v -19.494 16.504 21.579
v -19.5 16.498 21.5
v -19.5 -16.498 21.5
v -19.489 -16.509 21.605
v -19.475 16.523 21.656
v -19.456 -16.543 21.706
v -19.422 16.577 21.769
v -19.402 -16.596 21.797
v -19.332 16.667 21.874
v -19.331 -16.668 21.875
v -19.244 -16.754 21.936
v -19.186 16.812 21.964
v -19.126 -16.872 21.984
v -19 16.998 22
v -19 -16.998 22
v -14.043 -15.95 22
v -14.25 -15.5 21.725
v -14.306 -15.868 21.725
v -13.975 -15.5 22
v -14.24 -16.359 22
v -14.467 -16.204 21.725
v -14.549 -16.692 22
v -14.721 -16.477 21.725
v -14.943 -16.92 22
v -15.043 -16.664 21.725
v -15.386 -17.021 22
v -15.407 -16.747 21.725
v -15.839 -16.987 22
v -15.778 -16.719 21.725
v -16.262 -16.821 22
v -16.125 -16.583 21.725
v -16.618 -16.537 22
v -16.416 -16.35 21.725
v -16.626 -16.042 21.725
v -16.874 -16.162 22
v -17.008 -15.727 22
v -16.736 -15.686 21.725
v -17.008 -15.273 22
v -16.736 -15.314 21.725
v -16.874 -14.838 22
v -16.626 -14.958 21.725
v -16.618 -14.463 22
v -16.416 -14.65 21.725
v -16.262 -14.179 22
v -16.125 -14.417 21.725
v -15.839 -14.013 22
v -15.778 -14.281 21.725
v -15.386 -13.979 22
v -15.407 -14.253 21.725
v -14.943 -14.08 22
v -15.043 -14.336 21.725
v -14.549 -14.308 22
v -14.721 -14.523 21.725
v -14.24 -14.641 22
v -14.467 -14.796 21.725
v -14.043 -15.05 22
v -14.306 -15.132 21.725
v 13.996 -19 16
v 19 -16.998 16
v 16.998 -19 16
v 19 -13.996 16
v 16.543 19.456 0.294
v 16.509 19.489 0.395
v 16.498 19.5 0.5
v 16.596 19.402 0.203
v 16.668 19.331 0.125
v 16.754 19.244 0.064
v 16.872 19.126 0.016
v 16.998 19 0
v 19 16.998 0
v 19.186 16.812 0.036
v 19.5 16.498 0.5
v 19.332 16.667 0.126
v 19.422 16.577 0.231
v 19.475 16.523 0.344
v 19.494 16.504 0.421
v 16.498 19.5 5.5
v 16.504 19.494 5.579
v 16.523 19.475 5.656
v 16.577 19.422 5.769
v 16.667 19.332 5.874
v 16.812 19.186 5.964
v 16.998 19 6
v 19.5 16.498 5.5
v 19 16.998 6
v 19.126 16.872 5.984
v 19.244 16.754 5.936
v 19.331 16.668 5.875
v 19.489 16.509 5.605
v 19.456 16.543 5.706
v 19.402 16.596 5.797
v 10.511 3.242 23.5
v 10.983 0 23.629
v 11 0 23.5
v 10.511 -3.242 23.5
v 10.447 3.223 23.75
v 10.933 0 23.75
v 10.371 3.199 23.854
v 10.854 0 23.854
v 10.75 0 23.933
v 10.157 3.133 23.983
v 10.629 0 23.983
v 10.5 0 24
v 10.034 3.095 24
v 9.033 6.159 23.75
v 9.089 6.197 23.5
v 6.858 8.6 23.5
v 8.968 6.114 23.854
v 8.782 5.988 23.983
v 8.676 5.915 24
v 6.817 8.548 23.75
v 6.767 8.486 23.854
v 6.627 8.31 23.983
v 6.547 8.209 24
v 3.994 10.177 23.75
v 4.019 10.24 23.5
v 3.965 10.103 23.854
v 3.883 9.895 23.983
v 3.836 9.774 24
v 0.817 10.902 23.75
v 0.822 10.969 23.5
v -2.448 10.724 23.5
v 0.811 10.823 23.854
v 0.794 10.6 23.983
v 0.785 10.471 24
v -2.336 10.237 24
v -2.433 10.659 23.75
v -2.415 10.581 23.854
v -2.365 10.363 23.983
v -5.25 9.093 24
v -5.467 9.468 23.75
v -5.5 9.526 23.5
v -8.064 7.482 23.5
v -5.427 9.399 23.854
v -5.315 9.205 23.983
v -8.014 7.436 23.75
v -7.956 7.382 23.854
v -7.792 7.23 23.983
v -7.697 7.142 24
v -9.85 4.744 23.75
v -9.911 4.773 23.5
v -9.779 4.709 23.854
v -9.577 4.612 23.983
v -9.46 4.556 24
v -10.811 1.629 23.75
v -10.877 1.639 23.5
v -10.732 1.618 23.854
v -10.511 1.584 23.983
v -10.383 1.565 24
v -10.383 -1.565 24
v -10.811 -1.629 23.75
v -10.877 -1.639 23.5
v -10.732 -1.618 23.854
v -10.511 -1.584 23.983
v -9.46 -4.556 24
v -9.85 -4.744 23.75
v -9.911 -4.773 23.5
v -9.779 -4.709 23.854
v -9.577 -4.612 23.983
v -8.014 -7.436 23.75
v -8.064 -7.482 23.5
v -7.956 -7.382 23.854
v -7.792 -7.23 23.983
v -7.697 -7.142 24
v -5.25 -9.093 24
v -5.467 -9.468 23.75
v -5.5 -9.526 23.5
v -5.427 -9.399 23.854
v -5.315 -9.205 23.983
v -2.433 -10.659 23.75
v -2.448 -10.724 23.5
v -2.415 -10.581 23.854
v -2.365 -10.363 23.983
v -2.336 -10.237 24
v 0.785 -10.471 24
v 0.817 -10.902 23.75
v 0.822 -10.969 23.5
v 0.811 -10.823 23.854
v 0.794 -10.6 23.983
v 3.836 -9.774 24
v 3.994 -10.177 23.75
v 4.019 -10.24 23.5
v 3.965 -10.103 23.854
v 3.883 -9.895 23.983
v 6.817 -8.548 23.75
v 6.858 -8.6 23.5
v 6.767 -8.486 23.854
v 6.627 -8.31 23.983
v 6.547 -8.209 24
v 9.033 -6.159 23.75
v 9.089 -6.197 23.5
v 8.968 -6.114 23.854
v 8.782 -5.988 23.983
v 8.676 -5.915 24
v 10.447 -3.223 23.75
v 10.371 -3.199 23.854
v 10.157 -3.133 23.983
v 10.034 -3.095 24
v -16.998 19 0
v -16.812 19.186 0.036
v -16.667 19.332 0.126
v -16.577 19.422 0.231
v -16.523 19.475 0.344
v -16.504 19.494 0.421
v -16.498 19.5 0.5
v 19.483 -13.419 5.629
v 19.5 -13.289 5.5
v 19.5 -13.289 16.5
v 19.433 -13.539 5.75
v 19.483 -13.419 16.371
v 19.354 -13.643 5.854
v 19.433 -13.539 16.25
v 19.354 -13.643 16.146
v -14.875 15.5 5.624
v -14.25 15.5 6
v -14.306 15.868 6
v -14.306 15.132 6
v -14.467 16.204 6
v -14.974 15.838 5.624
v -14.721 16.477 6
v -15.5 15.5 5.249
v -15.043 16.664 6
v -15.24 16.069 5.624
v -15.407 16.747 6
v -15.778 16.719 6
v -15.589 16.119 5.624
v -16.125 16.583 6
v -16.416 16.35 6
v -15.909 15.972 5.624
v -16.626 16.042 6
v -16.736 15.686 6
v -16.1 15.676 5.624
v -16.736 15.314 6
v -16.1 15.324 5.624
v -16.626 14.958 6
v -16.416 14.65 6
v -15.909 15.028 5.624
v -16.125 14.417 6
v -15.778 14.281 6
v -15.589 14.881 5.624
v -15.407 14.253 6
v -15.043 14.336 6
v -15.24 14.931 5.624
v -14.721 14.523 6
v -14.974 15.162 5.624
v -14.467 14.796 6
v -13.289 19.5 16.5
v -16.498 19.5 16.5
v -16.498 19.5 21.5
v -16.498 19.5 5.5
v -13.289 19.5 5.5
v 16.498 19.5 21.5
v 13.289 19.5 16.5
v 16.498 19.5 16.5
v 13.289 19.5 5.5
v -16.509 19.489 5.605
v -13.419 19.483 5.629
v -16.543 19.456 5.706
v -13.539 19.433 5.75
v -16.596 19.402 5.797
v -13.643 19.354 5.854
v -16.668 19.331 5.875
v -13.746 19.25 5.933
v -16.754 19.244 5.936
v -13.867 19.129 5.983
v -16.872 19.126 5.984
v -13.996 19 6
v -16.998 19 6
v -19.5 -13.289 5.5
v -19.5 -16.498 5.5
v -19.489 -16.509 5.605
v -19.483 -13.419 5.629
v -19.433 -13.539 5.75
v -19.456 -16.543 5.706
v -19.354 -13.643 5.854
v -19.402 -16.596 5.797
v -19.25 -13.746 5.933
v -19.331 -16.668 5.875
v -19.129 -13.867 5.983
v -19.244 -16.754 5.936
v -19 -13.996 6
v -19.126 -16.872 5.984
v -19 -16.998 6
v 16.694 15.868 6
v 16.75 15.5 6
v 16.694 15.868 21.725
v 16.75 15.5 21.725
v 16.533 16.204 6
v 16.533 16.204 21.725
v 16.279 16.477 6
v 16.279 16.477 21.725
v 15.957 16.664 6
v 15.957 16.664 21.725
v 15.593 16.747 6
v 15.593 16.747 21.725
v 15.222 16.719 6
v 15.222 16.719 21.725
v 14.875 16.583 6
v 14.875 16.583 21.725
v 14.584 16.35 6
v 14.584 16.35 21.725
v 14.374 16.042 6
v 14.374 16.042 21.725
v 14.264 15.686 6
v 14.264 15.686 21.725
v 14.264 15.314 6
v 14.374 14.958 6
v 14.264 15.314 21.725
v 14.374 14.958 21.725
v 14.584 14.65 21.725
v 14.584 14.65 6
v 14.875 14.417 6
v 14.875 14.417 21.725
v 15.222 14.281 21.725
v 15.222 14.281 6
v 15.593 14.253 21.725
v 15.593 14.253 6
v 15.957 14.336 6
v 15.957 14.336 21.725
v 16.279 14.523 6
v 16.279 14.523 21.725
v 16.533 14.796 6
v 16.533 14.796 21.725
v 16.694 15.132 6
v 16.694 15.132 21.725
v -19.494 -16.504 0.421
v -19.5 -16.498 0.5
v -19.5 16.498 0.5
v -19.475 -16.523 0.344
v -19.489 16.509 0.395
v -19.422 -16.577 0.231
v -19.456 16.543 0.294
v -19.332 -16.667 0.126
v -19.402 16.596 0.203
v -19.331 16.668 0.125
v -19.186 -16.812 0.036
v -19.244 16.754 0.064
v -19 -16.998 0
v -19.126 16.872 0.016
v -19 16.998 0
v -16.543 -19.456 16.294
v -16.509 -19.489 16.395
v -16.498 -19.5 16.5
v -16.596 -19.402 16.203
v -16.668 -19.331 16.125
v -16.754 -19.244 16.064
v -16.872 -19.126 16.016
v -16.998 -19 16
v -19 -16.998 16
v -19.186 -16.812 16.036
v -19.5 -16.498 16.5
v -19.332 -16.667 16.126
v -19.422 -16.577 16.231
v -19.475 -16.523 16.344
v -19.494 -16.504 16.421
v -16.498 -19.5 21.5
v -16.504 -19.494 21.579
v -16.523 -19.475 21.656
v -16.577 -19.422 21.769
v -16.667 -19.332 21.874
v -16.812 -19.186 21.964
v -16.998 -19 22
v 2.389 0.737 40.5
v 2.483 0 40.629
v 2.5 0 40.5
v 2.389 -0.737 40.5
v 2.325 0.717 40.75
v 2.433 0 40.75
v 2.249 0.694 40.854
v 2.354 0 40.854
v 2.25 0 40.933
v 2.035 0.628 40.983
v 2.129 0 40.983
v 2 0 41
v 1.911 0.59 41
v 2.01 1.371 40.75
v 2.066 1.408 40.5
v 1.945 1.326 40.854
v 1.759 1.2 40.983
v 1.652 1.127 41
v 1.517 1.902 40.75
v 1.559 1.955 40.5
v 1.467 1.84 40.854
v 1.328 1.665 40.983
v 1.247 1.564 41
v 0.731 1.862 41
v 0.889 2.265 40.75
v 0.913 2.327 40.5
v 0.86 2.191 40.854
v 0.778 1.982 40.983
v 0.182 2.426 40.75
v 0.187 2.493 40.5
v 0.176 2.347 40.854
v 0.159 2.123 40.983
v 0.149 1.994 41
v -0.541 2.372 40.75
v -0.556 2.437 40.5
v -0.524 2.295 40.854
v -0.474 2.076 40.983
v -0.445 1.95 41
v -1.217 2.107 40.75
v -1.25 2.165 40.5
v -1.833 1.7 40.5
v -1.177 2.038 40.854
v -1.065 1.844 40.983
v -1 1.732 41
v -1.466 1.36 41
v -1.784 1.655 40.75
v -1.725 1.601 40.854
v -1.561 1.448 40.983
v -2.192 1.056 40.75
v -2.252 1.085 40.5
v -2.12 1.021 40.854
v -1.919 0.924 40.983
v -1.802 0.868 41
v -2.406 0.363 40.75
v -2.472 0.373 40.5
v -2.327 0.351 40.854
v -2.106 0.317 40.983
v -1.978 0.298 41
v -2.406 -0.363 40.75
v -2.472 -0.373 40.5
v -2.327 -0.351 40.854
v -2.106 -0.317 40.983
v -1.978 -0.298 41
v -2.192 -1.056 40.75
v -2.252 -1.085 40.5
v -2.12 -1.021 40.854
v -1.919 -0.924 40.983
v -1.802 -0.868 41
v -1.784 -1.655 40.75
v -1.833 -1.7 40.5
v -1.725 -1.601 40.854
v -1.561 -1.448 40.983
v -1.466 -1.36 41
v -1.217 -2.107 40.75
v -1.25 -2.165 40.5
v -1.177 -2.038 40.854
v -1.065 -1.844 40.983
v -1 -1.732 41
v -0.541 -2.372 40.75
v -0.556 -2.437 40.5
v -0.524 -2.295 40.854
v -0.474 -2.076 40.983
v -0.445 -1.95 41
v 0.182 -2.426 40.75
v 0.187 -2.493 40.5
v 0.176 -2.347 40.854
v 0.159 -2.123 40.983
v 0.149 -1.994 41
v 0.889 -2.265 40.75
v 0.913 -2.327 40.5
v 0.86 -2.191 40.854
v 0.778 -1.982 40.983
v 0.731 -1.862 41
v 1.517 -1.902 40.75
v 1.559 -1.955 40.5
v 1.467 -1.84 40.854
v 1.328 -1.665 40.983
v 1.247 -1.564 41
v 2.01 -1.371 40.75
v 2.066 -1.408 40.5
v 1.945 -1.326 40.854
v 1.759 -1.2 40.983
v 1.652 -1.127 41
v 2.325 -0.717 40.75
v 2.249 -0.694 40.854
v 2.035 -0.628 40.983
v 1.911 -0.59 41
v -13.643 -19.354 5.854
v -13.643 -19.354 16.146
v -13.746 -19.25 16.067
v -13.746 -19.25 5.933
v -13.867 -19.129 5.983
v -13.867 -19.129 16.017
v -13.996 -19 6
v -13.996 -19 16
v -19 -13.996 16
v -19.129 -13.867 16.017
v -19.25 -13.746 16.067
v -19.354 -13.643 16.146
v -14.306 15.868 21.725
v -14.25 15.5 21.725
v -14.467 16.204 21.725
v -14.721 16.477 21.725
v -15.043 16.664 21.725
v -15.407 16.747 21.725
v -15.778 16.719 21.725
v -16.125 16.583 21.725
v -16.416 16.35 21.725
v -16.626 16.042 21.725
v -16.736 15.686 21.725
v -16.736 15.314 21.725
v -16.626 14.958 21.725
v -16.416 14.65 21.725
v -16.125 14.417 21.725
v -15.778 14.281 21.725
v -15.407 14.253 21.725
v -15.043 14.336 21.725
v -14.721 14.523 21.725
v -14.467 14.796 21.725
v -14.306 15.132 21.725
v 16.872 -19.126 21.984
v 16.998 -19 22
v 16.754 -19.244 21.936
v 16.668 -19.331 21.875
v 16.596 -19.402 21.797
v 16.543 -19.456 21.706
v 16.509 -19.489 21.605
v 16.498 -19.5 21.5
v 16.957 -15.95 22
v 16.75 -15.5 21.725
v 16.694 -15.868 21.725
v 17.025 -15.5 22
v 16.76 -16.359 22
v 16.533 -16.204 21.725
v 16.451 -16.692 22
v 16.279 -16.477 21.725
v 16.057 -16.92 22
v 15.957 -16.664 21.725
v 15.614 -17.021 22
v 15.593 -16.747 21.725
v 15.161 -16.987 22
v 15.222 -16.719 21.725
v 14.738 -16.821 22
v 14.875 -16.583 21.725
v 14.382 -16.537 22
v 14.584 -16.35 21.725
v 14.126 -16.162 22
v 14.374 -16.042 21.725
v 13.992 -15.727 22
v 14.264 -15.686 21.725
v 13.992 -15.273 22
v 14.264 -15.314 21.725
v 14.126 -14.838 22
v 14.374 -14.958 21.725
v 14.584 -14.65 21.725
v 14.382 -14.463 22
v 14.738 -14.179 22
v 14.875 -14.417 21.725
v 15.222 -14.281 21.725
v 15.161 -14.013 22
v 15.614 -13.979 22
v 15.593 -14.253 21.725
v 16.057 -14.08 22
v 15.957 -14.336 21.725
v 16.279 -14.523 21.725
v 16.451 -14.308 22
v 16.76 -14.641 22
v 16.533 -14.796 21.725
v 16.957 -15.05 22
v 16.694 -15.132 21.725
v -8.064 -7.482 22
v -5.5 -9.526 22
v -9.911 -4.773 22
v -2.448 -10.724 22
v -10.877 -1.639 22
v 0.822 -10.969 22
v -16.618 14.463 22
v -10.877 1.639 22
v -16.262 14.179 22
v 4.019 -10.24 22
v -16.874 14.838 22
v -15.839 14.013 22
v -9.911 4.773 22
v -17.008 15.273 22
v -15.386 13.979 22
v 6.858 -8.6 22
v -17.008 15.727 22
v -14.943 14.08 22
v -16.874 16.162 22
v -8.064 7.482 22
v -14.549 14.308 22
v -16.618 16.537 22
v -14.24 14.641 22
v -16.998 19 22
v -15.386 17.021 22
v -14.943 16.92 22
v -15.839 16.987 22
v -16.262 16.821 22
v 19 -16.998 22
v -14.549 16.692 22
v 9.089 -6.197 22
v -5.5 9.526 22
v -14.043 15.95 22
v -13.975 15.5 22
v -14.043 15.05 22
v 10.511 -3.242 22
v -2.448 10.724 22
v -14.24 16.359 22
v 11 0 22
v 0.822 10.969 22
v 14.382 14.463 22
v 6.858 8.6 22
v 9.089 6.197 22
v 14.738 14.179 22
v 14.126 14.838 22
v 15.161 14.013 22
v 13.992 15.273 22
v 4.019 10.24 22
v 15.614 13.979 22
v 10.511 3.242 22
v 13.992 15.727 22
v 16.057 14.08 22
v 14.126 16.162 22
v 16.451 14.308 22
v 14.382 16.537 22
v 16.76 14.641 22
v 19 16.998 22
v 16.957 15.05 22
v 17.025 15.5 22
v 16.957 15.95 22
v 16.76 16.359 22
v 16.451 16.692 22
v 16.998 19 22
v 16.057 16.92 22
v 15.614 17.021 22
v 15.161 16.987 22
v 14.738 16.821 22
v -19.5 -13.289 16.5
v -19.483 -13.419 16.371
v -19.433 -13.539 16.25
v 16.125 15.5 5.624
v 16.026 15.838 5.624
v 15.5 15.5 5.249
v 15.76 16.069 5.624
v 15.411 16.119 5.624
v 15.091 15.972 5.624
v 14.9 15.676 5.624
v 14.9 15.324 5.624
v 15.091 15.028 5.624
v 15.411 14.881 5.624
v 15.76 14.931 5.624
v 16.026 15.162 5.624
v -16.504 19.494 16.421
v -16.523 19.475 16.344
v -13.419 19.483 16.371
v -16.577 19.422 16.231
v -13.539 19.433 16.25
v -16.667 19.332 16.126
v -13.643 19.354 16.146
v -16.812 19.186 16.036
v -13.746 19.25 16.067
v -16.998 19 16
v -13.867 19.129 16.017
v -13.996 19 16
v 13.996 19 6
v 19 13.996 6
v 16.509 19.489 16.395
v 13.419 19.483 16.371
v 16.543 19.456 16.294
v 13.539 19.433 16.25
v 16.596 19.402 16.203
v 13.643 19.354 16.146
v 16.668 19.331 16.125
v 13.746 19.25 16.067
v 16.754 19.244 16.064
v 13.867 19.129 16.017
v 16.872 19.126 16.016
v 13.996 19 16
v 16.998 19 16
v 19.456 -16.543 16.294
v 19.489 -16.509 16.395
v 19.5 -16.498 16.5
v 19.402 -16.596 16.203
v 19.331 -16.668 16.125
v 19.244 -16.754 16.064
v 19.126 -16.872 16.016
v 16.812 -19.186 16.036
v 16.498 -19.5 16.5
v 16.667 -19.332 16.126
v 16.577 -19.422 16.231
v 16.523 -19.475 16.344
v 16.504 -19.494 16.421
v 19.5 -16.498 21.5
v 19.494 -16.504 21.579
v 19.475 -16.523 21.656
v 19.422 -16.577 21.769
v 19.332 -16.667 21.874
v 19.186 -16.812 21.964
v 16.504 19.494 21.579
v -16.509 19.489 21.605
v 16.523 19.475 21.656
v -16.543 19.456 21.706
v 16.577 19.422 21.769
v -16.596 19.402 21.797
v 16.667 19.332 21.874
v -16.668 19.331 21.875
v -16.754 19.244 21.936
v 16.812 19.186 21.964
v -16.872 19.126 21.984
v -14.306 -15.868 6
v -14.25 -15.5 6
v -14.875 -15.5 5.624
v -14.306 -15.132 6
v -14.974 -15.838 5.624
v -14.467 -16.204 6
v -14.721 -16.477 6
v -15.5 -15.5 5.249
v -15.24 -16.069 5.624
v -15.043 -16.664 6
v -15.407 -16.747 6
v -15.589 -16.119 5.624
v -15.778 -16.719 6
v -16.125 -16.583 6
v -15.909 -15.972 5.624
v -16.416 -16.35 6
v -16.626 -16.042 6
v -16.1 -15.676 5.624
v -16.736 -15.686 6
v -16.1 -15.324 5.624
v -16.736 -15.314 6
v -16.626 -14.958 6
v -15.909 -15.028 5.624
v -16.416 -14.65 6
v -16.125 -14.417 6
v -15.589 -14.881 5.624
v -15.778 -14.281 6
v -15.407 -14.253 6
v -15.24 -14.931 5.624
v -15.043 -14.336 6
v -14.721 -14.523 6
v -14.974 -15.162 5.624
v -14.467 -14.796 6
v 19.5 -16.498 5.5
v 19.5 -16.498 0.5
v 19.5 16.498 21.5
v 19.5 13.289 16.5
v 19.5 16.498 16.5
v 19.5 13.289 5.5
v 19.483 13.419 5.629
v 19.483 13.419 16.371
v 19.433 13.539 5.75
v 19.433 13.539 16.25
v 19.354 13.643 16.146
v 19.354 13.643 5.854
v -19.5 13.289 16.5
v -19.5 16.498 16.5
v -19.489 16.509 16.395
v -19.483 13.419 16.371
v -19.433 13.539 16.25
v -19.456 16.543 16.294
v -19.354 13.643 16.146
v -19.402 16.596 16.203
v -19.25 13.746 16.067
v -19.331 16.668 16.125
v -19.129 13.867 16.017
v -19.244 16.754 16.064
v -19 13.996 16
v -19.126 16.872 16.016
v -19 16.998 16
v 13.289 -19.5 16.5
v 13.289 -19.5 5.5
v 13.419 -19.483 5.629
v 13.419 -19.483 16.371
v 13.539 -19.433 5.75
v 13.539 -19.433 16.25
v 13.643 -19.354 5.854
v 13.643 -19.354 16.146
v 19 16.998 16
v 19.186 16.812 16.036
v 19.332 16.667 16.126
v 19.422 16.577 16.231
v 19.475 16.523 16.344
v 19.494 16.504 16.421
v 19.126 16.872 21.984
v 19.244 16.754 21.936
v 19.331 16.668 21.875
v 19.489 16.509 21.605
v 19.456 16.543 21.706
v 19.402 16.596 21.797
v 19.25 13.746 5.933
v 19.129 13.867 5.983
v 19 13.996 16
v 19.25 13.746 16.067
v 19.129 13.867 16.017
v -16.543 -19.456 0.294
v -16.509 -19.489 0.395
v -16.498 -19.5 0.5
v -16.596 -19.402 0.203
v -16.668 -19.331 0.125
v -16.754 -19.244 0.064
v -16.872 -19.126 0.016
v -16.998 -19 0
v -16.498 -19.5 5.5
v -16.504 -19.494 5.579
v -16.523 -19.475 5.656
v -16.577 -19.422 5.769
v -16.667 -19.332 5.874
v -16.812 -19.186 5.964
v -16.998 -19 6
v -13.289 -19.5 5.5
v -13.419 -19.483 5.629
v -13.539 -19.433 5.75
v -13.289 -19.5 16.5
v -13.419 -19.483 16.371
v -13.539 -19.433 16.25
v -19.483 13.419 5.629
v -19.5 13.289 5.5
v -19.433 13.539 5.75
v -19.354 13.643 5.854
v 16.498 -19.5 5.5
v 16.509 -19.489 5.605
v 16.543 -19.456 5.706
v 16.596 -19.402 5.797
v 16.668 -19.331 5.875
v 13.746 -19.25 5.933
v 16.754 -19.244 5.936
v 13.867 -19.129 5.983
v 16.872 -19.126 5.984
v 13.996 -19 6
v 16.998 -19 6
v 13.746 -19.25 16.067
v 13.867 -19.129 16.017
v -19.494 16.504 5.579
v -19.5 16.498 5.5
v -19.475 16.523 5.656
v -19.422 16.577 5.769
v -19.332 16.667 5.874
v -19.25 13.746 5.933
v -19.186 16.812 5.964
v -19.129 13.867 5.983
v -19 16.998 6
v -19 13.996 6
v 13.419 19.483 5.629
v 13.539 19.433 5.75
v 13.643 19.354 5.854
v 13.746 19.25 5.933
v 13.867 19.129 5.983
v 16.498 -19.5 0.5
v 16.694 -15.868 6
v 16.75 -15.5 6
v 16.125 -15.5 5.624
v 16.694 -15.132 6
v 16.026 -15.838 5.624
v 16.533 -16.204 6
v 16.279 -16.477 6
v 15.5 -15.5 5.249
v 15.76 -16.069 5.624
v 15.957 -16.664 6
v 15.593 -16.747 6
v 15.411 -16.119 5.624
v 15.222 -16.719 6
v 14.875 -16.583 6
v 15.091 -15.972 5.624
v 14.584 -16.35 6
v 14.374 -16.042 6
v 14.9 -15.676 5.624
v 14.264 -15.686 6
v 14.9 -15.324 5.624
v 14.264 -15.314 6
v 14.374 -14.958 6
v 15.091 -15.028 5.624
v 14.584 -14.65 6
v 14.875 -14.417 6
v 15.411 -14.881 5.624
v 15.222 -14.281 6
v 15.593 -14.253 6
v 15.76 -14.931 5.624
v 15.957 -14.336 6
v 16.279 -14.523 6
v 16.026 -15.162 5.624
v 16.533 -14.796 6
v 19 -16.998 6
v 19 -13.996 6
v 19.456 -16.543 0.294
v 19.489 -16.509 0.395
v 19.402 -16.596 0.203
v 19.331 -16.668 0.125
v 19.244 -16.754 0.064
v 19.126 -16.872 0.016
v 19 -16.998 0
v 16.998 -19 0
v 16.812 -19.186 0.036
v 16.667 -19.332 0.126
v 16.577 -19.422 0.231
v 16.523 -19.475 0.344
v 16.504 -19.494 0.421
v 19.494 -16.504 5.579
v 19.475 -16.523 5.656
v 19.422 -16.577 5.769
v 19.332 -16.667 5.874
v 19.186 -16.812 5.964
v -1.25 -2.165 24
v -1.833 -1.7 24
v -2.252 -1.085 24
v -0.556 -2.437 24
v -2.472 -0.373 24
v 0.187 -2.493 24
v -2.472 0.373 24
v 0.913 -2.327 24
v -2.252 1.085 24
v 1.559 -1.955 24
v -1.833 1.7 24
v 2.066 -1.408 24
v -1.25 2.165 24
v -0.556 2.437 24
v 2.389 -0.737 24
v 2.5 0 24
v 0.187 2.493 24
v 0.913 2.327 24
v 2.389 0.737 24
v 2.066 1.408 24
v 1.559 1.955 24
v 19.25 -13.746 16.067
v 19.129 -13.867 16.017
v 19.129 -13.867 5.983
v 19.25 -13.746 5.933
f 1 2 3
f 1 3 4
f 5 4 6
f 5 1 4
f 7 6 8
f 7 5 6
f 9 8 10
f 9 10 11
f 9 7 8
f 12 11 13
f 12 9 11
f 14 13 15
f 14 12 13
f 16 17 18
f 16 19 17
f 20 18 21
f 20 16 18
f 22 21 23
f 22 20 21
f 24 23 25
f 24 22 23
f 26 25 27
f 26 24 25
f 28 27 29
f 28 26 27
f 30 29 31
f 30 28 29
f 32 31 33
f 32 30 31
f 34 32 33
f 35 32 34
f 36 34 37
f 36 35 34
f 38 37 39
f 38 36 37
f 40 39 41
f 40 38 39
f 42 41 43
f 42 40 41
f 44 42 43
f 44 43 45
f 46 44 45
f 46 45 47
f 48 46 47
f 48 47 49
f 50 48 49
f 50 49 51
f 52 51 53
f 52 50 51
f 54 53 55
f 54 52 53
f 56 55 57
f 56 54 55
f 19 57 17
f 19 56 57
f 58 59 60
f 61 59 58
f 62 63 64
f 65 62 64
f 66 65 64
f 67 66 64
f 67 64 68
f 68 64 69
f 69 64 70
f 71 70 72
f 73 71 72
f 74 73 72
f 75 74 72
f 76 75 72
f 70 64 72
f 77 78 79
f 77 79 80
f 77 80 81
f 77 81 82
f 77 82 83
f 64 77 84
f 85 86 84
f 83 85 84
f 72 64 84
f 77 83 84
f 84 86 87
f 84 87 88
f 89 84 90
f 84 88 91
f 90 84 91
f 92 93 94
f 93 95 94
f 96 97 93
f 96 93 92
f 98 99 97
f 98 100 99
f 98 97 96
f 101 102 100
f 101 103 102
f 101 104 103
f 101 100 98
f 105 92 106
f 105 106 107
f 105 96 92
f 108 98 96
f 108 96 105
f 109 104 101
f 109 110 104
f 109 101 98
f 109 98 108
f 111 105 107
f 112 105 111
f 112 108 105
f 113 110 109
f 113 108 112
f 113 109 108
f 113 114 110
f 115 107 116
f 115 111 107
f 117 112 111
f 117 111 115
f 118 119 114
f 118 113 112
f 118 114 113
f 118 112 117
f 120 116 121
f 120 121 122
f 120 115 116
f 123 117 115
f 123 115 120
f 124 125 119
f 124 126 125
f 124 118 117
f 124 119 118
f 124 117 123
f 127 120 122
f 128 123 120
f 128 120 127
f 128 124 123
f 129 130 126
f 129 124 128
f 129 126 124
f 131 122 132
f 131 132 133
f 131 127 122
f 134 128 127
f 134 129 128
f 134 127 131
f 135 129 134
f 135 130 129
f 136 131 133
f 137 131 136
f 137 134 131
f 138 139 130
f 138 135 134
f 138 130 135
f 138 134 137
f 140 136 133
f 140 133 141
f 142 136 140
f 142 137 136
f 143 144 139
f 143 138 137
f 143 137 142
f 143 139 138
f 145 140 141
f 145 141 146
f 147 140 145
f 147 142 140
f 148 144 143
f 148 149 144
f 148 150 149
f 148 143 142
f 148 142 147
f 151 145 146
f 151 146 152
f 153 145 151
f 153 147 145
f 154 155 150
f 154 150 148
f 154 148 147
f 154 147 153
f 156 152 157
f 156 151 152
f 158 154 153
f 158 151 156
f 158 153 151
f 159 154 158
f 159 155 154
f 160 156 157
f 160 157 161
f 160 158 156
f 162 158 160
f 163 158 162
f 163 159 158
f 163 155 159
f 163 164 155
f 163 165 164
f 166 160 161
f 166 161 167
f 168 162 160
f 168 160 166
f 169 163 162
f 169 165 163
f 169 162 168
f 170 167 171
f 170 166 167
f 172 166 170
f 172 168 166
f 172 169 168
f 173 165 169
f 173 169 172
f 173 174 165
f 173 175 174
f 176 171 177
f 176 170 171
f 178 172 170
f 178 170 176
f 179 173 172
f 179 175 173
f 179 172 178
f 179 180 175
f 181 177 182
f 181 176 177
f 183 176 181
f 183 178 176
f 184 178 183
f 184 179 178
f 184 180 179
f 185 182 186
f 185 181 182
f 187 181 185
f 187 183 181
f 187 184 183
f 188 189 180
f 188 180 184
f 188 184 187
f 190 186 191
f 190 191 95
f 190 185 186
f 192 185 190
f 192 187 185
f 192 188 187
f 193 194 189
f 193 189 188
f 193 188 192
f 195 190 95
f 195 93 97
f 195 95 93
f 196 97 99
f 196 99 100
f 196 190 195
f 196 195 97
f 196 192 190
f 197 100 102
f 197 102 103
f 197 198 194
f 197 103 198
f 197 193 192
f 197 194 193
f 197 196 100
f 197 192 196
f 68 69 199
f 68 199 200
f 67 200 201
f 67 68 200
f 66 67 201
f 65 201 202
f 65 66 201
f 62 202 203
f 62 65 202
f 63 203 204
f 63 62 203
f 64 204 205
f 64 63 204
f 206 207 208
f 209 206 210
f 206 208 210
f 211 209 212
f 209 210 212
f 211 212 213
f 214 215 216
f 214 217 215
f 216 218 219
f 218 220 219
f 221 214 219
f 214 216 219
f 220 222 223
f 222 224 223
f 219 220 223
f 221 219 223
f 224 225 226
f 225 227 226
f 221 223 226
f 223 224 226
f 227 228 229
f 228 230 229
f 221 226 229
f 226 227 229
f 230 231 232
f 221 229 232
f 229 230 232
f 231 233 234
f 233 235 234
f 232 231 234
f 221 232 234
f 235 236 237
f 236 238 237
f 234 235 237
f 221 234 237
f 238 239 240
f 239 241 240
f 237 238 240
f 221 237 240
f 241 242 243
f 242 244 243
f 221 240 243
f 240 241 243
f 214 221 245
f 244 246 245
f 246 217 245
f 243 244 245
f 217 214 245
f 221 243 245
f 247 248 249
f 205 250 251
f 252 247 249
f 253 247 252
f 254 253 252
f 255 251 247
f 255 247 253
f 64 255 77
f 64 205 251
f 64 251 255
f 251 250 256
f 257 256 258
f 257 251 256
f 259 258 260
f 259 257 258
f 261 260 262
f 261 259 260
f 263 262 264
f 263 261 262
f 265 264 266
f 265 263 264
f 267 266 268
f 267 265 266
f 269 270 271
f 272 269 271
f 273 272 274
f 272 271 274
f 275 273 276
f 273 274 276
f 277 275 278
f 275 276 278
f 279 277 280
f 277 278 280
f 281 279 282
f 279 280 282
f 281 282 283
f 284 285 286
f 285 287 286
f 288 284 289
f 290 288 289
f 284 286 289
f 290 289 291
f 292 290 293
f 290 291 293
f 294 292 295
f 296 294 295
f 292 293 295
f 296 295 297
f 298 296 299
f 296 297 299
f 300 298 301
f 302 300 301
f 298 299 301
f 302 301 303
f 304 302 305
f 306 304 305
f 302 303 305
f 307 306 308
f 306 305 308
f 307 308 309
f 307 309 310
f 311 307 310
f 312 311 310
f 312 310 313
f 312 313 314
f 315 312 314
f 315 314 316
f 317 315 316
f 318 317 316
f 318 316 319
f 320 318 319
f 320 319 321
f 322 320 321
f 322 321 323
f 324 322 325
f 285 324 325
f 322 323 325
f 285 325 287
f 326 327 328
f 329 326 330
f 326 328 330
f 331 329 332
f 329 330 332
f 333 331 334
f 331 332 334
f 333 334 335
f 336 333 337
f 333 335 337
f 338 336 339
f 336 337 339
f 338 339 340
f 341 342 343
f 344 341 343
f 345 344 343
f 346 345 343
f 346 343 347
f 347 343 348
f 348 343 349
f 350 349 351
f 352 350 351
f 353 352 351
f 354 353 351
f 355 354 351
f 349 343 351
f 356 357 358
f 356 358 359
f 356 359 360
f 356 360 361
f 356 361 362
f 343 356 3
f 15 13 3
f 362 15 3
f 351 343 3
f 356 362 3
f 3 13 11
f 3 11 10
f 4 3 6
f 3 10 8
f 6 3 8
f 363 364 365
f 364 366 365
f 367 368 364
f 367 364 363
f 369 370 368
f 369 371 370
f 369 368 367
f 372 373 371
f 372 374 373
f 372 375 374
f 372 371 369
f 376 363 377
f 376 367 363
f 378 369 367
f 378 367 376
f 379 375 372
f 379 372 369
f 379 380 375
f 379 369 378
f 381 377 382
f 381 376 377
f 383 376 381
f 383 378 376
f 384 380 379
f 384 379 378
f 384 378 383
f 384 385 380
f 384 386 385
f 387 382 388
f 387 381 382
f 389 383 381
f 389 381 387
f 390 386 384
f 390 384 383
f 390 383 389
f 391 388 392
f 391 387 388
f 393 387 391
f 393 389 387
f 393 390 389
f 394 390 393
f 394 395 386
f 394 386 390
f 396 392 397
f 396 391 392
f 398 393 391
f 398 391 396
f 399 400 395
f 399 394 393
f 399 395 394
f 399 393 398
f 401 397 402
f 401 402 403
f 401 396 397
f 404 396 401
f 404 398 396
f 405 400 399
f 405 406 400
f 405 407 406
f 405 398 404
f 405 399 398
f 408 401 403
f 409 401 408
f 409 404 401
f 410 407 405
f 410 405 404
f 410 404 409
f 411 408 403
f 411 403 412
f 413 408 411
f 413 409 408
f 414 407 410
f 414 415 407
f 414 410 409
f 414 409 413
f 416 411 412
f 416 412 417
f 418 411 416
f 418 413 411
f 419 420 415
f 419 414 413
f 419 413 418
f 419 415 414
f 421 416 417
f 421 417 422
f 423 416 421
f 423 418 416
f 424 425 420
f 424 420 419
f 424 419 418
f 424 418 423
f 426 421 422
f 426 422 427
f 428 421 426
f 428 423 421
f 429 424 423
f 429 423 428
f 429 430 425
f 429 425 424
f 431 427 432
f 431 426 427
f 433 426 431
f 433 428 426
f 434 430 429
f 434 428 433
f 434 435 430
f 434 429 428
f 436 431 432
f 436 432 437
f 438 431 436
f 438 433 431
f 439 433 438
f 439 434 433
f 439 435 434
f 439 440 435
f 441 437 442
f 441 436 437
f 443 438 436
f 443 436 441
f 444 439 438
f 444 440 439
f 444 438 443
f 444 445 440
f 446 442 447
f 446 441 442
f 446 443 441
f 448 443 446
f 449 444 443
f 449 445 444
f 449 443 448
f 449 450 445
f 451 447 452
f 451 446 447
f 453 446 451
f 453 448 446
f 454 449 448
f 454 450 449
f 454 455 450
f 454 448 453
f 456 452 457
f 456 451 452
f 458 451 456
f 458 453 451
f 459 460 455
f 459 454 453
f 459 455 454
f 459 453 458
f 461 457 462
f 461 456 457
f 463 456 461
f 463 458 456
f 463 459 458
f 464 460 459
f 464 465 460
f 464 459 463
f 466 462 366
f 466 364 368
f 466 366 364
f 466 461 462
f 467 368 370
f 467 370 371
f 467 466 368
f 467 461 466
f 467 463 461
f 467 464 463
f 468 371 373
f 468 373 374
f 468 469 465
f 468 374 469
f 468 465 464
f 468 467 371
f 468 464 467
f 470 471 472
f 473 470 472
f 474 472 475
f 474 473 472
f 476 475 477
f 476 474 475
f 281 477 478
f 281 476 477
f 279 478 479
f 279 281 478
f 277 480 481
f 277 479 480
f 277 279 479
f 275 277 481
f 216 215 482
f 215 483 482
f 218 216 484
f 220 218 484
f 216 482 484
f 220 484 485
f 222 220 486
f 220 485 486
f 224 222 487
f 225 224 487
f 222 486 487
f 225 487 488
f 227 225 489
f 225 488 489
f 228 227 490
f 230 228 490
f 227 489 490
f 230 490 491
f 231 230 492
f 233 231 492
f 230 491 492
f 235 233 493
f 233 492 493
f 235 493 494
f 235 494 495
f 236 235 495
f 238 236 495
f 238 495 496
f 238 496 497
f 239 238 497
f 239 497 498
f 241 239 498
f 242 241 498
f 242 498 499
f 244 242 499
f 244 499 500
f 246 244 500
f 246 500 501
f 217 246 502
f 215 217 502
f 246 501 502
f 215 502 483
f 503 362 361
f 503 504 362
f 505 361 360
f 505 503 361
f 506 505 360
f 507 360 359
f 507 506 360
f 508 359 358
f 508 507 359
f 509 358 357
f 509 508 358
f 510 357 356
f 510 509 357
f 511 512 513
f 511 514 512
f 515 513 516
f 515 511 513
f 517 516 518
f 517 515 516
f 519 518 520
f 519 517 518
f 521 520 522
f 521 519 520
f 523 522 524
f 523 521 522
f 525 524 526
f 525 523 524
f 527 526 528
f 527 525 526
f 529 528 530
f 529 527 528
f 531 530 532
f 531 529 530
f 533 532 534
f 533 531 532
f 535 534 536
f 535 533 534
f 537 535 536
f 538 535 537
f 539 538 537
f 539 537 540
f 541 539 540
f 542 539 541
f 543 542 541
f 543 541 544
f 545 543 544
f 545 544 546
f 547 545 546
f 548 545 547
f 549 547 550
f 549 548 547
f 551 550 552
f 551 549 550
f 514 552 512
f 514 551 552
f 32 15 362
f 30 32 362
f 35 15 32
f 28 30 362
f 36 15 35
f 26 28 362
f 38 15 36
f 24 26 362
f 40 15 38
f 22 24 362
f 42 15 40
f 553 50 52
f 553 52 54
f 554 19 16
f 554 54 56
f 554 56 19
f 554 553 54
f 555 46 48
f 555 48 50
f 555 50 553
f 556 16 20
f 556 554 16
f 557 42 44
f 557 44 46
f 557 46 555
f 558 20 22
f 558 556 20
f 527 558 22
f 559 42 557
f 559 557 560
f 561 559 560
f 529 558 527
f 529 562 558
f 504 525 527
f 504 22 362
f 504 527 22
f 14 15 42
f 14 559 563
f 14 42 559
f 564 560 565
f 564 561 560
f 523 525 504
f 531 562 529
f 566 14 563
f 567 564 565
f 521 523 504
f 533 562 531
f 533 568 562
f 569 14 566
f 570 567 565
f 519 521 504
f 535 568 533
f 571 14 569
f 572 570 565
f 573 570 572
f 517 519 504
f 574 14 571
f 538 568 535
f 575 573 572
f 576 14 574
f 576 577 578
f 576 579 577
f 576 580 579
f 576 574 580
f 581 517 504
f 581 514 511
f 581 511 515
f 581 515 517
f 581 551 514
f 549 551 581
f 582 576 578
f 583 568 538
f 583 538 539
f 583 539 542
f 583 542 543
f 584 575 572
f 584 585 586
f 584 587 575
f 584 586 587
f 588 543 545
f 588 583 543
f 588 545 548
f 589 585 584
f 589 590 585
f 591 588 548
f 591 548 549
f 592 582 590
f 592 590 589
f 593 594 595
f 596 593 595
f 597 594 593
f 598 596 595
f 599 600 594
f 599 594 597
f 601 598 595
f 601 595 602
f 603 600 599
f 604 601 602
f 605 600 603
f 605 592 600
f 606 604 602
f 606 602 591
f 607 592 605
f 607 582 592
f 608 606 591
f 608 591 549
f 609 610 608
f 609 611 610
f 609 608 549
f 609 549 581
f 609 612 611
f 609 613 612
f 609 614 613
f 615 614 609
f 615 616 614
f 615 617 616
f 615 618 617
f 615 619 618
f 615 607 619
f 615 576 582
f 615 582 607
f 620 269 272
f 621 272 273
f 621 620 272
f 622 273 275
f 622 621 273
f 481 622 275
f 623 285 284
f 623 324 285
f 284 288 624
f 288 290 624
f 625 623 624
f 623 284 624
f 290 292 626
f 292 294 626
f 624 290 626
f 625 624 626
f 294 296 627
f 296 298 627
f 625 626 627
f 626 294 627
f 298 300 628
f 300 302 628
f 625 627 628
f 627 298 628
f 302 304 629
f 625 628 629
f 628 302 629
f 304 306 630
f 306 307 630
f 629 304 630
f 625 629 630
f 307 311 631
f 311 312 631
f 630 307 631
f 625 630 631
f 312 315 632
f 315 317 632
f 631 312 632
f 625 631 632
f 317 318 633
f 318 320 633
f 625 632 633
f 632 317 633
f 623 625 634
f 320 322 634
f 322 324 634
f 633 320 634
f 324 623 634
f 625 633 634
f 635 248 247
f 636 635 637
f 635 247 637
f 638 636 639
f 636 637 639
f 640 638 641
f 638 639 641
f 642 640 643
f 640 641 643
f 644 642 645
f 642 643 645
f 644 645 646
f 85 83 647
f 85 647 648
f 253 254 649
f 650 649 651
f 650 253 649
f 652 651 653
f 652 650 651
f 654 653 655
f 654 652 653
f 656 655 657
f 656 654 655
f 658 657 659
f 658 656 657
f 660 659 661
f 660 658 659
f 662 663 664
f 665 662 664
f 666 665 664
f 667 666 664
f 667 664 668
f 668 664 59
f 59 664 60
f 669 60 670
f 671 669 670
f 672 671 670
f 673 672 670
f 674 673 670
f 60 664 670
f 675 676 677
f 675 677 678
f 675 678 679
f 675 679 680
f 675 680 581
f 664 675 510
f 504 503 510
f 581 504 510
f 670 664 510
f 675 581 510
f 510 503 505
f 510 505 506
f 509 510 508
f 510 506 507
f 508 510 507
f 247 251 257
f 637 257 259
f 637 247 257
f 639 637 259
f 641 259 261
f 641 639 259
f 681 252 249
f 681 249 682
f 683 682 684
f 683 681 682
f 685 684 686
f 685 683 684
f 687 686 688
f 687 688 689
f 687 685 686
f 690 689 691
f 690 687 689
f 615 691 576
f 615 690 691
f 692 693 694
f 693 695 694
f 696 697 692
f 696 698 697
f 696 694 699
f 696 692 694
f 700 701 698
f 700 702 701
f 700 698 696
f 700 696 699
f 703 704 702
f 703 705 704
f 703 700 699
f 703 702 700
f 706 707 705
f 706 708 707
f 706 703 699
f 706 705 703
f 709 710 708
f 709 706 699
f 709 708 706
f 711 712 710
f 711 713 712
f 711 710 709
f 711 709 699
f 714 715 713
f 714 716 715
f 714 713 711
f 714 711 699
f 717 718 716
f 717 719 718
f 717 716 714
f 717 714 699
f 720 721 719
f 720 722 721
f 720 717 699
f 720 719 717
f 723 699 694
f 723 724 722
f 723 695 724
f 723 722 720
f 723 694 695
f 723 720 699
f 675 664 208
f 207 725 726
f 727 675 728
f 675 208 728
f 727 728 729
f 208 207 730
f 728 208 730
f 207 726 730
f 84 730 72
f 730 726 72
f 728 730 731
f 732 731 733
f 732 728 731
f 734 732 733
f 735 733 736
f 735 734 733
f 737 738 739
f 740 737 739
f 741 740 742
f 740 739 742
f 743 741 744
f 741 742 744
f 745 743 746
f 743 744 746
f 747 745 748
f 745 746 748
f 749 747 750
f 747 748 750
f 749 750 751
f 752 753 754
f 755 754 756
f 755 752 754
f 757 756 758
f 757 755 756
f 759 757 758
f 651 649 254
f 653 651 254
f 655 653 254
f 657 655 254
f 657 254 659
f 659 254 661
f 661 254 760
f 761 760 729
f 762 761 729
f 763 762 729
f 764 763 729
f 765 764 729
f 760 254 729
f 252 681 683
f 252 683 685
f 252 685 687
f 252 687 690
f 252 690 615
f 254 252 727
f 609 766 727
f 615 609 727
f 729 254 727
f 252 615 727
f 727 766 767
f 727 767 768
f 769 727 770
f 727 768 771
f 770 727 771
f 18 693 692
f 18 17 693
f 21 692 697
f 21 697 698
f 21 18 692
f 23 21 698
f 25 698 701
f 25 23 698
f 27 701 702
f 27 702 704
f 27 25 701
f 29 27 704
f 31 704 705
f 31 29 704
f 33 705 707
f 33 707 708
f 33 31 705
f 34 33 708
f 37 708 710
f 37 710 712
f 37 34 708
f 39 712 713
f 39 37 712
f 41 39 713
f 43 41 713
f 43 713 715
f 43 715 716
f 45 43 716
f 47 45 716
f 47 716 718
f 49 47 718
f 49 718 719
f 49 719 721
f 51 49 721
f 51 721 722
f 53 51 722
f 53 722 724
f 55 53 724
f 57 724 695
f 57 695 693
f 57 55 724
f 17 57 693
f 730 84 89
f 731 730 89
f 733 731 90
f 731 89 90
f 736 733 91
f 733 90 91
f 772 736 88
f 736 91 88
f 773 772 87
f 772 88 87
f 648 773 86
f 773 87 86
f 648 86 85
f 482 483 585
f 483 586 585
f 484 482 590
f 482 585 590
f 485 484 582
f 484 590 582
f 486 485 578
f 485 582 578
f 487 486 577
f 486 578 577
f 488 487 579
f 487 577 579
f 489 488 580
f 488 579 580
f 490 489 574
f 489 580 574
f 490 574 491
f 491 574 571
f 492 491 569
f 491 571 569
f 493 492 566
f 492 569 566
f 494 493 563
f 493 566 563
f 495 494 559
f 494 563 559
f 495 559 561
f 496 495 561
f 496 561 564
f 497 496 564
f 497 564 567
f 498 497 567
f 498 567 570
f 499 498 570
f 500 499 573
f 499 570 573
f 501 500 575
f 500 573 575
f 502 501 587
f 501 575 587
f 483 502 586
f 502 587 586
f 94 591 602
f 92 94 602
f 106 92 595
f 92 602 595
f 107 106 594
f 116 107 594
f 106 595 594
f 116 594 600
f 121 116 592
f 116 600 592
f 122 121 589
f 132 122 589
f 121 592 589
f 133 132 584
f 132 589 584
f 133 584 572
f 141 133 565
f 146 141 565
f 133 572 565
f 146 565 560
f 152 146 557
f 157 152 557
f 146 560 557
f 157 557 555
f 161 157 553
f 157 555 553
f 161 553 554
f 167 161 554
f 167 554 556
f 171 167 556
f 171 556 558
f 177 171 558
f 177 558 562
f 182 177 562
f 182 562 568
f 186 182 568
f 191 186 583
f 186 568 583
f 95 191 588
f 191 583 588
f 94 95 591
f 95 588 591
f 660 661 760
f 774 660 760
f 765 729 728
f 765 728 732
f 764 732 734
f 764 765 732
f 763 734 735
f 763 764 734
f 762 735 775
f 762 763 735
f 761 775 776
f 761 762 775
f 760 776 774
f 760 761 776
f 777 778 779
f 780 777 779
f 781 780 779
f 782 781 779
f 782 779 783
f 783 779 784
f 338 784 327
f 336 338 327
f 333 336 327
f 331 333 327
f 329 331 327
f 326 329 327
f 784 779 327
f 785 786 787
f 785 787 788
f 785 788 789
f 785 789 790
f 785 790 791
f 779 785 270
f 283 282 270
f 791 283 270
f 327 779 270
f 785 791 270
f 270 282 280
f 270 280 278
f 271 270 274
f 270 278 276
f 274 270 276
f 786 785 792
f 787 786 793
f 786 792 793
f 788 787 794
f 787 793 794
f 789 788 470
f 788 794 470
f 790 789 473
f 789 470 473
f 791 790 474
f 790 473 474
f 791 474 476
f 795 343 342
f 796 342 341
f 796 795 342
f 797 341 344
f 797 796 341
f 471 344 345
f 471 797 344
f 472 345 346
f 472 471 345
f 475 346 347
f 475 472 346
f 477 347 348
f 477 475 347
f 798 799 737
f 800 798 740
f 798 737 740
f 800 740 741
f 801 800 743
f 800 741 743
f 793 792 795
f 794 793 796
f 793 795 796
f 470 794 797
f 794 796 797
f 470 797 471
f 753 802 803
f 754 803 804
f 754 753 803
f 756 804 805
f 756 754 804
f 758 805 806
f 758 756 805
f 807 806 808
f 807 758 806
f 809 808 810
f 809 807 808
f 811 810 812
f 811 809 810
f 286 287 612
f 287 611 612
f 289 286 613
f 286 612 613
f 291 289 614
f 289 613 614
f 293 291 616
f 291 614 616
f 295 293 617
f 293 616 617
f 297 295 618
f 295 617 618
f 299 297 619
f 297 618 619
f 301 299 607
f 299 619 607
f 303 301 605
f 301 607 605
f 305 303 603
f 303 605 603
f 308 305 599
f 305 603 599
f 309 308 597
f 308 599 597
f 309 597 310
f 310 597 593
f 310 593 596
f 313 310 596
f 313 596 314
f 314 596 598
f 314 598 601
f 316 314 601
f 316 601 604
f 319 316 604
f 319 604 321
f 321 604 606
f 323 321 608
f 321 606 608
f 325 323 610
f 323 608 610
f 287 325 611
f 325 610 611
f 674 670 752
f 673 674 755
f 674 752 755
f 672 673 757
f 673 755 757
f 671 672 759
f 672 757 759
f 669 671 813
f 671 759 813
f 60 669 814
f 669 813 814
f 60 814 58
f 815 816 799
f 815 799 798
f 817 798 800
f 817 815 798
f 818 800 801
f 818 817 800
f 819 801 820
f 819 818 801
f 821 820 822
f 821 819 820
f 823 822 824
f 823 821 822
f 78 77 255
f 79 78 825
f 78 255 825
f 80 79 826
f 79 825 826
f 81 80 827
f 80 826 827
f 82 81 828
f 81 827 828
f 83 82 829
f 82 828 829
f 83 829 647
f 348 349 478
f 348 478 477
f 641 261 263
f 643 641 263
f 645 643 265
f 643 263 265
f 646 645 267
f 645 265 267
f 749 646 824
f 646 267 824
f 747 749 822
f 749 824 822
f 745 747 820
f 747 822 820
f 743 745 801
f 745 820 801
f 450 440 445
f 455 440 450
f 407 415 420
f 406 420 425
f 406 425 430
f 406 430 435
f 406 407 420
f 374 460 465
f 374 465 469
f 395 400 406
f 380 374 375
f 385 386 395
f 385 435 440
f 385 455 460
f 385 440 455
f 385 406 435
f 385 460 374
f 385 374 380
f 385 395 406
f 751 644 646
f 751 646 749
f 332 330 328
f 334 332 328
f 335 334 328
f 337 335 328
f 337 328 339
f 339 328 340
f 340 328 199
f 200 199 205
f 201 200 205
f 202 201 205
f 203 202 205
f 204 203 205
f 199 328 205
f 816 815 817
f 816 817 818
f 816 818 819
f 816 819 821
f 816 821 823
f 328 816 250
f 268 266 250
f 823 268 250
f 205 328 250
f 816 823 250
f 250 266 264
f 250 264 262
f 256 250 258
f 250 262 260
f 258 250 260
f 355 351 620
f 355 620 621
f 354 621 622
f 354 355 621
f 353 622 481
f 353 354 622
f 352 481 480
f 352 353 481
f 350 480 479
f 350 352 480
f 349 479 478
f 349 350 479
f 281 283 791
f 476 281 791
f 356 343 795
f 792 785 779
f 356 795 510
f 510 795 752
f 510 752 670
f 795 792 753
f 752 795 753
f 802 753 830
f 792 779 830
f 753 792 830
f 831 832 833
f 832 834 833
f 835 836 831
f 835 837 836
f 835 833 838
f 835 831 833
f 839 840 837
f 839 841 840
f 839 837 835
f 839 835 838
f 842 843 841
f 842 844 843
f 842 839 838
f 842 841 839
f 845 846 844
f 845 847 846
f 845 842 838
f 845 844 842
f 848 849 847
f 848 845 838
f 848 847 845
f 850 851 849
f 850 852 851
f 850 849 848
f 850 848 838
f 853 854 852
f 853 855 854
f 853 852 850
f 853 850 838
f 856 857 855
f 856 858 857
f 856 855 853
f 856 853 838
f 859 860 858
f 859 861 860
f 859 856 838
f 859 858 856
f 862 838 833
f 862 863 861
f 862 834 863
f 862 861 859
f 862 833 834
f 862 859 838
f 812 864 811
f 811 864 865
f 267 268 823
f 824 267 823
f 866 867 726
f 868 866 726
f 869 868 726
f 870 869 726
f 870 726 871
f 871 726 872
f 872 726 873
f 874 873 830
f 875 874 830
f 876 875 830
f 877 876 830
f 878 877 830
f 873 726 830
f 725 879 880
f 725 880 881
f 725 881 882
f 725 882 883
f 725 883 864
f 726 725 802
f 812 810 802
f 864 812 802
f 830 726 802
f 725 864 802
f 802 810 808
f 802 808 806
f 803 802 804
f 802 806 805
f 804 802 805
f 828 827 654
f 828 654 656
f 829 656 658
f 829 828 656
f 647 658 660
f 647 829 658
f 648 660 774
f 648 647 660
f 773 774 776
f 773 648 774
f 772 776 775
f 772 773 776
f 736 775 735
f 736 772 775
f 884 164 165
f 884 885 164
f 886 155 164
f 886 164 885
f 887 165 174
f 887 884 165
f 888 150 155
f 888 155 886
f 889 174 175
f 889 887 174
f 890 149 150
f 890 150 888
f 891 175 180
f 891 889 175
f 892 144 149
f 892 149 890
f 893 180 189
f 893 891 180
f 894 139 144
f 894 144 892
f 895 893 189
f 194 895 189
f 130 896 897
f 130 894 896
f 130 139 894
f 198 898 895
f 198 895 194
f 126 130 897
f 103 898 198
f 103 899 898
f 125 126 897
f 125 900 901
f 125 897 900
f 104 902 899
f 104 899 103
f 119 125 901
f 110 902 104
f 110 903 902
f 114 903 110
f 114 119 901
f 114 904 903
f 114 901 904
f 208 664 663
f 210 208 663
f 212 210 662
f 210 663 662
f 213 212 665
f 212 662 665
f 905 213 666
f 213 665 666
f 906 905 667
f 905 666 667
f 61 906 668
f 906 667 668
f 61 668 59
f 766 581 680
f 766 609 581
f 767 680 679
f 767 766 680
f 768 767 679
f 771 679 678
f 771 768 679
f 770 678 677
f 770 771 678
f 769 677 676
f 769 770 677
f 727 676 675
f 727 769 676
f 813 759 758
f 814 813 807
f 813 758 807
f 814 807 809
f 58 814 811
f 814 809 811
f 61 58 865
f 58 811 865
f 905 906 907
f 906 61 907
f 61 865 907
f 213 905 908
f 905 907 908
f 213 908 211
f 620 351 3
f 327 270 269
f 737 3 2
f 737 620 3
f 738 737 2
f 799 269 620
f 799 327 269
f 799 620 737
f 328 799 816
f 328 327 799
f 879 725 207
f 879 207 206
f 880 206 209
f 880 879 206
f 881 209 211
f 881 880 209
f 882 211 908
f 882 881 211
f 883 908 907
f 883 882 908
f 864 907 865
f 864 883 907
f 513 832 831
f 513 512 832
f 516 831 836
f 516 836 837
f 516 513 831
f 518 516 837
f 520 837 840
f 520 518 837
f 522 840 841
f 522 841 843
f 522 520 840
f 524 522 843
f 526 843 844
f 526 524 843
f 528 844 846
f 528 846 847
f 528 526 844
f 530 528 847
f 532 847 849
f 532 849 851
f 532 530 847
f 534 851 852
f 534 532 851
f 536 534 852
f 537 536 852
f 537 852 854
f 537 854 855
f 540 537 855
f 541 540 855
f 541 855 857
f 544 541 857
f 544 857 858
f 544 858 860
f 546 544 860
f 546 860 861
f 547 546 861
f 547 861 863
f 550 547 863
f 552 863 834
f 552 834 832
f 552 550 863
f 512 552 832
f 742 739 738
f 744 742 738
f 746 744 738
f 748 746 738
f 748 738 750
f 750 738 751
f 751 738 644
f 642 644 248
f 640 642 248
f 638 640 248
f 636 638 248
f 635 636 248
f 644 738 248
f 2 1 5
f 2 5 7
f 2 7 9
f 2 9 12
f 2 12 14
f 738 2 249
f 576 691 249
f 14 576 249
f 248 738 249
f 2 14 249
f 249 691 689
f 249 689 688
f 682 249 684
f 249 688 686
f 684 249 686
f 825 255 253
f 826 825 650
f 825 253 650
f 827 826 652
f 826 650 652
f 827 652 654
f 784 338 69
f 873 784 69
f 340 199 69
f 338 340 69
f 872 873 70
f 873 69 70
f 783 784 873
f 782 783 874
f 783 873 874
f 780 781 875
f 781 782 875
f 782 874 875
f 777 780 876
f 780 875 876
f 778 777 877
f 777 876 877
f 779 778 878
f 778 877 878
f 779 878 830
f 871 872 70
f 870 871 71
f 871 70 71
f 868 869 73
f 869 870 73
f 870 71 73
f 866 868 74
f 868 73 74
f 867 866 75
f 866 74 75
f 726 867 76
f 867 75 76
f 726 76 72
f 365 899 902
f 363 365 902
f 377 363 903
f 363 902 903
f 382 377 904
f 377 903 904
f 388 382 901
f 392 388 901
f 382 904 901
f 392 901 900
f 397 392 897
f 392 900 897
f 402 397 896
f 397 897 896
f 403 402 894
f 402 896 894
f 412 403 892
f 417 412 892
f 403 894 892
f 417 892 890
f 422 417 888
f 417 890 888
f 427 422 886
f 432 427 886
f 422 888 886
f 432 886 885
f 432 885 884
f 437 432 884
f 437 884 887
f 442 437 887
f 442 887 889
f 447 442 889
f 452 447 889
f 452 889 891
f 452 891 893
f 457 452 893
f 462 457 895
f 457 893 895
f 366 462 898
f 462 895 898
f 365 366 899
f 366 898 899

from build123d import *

# Parameters (mm, degrees)
SKETCH_1_W               = 39
SKETCH_1_H               = 39
EXTRUDE_1_DEPTH          = 22
SKETCH_2_R               = 11
EXTRUDE_2_DEPTH          = 2
SKETCH_3_R               = 2.5
EXTRUDE_3_DEPTH          = 17
CUT_EXTRUDE_1_DEPTH      = 5
CUT_EXTRUDE_1_DEPTH_BACK = 5
FILLET_1_R               = 0.5
CUT_EXTRUDE_2_DEPTH      = 36.277471565


# Read off the part's stored shape, not the designer's step: M3 螺纹孔1
with BuildPart() as part:
    # 草图1 → 凸台-拉伸1 (new body)
    with BuildSketch(Plane.XY):
        Rectangle(SKETCH_1_W, SKETCH_1_H)
    extrude(amount=EXTRUDE_1_DEPTH)

    # 草图2 → 凸台-拉伸2 (add)
    with BuildSketch(Plane.XY.offset(22)):
        Circle(SKETCH_2_R)
    extrude(amount=EXTRUDE_2_DEPTH)

    # 草图3 → 凸台-拉伸3 (add)
    with BuildSketch(Plane.XY.offset(24)):
        Circle(SKETCH_3_R)
    extrude(amount=EXTRUDE_3_DEPTH)

    # 草图5 → 切除-拉伸1 (cut, two sides: drawn at the far end of the back side and taken through both)
    with BuildSketch(Plane.XY.offset(11).offset(-CUT_EXTRUDE_1_DEPTH_BACK)):
        Polygon((13.496470179, 19.5), (19.5, 13.496470179), (19.5, 19.5), align=None)
        Polygon((19.5, -19.5), (13.49647018, -19.5), (19.5, -13.496470179), align=None)
        Polygon((-13.496470179, -19.5), (-19.5, -13.49647018), (-19.5, -19.5), align=None)
        Polygon((-19.5, 13.496470179), (-19.5, 19.5), (-13.496470179, 19.5), align=None)
    extrude(amount=CUT_EXTRUDE_1_DEPTH + CUT_EXTRUDE_1_DEPTH_BACK, mode=Mode.SUBTRACT)

    # 圆角1
    fillet_1_edges = [part.edges().sort_by_distance(p)[0] for p in [
        (-19.5, 0, 22),
        (-11, 0, 24),
        (0, -19.5, 22),
        (-2.5, 0, 41),
        (19.5, -19.5, 3),
        (-19.5, -19.5, 3),
        (-19.5, 19.5, 3),
        (19.5, 19.5, 3),
        (-19.5, 13.496470179, 11),
        (-13.496470179, 19.5, 11),
        (-16.49823509, 19.5, 6),
        (-19.5, 16.49823509, 6),
        (-16.49823509, 19.5, 16),
        (-19.5, 16.49823509, 16),
        (-16.49823509, -19.5, 6),
        (-13.496470179, -19.5, 11),
        (-19.5, -13.49647018, 11),
        (-19.5, -16.49823509, 6),
        (-16.49823509, -19.5, 16),
        (-19.5, -16.49823509, 16),
        (19.5, -16.49823509, 6),
        (19.5, -13.496470179, 11),
        (13.49647018, -19.5, 11),
        (16.49823509, -19.5, 6),
        (19.5, -16.49823509, 16),
        (16.49823509, -19.5, 16),
        (19.5, 0, 22),
        (0, -19.5, 0),
        (16.49823509, 19.5, 6),
        (13.496470179, 19.5, 11),
        (19.5, 13.496470179, 11),
        (19.5, 16.49823509, 6),
        (16.49823509, 19.5, 16),
        (19.5, 16.49823509, 16),
        (-19.5, 0, 0),
        (0, 19.5, 0),
        (19.5, 0, 0),
        (19.5, -19.5, 19),
        (-19.5, -19.5, 19),
        (-19.5, 19.5, 19),
        (19.5, 19.5, 19),
        (0, 19.5, 22),
    ]]
    fillet(fillet_1_edges, radius=FILLET_1_R)

    # 草图6 → 切除-拉伸2 (cut, through all)
    with BuildSketch(Plane.XY.offset(22)):
        Polygon((19.5, 19.5), (16.49823509, 19.5), (19.5, 16.49823509), align=None)
        Polygon((19.5, -19.5), (19.5, -16.49823509), (16.49823509, -19.5), align=None)
        Polygon((-19.5, -19.5), (-16.49823509, -19.5), (-19.5, -16.49823509), align=None)
        Polygon((-19.5, 19.5), (-19.5, 16.49823509), (-16.49823509, 19.5), align=None)
    extrude(amount=-CUT_EXTRUDE_2_DEPTH, mode=Mode.SUBTRACT)

    # M3 螺纹孔1 outline → M3 螺纹孔1 (revolve, cut)
    with BuildSketch(Plane(origin=(-15.5, 15.5, 0), x_dir=(1, 0, 0), z_dir=(0, -1, 0))):
        Polygon((0, 22), (0, 5.248924226), (1.25, 6), (1.25, 21.725), (1.525, 22), align=None)
    hole_wizard_m3_1 = revolve(axis=Axis((-15.5, 15.5, 0), (0, 0, 1)), mode=Mode.SUBTRACT)

    # Hole Wizard M3 _1 2 outline → Hole Wizard M3 _1 2 (revolve, cut)
    with BuildSketch(Plane(origin=(15.5, 15.5, 0), x_dir=(1, 0, 0), z_dir=(0, -1, 0))):
        Polygon((0, 22), (0, 5.248924226), (1.25, 6), (1.25, 21.725), (1.525, 22), align=None)
    hole_wizard_m3_1_2 = revolve(axis=Axis((15.5, 15.5, 0), (0, 0, 1)), mode=Mode.SUBTRACT)

    # 镜向1: M3 螺纹孔1, Hole Wizard M3 _1 2 across plane
    add(hole_wizard_m3_1.mirror(Plane.ZX), mode=Mode.SUBTRACT)
    add(hole_wizard_m3_1_2.mirror(Plane.ZX), mode=Mode.SUBTRACT)


solid = part.part
